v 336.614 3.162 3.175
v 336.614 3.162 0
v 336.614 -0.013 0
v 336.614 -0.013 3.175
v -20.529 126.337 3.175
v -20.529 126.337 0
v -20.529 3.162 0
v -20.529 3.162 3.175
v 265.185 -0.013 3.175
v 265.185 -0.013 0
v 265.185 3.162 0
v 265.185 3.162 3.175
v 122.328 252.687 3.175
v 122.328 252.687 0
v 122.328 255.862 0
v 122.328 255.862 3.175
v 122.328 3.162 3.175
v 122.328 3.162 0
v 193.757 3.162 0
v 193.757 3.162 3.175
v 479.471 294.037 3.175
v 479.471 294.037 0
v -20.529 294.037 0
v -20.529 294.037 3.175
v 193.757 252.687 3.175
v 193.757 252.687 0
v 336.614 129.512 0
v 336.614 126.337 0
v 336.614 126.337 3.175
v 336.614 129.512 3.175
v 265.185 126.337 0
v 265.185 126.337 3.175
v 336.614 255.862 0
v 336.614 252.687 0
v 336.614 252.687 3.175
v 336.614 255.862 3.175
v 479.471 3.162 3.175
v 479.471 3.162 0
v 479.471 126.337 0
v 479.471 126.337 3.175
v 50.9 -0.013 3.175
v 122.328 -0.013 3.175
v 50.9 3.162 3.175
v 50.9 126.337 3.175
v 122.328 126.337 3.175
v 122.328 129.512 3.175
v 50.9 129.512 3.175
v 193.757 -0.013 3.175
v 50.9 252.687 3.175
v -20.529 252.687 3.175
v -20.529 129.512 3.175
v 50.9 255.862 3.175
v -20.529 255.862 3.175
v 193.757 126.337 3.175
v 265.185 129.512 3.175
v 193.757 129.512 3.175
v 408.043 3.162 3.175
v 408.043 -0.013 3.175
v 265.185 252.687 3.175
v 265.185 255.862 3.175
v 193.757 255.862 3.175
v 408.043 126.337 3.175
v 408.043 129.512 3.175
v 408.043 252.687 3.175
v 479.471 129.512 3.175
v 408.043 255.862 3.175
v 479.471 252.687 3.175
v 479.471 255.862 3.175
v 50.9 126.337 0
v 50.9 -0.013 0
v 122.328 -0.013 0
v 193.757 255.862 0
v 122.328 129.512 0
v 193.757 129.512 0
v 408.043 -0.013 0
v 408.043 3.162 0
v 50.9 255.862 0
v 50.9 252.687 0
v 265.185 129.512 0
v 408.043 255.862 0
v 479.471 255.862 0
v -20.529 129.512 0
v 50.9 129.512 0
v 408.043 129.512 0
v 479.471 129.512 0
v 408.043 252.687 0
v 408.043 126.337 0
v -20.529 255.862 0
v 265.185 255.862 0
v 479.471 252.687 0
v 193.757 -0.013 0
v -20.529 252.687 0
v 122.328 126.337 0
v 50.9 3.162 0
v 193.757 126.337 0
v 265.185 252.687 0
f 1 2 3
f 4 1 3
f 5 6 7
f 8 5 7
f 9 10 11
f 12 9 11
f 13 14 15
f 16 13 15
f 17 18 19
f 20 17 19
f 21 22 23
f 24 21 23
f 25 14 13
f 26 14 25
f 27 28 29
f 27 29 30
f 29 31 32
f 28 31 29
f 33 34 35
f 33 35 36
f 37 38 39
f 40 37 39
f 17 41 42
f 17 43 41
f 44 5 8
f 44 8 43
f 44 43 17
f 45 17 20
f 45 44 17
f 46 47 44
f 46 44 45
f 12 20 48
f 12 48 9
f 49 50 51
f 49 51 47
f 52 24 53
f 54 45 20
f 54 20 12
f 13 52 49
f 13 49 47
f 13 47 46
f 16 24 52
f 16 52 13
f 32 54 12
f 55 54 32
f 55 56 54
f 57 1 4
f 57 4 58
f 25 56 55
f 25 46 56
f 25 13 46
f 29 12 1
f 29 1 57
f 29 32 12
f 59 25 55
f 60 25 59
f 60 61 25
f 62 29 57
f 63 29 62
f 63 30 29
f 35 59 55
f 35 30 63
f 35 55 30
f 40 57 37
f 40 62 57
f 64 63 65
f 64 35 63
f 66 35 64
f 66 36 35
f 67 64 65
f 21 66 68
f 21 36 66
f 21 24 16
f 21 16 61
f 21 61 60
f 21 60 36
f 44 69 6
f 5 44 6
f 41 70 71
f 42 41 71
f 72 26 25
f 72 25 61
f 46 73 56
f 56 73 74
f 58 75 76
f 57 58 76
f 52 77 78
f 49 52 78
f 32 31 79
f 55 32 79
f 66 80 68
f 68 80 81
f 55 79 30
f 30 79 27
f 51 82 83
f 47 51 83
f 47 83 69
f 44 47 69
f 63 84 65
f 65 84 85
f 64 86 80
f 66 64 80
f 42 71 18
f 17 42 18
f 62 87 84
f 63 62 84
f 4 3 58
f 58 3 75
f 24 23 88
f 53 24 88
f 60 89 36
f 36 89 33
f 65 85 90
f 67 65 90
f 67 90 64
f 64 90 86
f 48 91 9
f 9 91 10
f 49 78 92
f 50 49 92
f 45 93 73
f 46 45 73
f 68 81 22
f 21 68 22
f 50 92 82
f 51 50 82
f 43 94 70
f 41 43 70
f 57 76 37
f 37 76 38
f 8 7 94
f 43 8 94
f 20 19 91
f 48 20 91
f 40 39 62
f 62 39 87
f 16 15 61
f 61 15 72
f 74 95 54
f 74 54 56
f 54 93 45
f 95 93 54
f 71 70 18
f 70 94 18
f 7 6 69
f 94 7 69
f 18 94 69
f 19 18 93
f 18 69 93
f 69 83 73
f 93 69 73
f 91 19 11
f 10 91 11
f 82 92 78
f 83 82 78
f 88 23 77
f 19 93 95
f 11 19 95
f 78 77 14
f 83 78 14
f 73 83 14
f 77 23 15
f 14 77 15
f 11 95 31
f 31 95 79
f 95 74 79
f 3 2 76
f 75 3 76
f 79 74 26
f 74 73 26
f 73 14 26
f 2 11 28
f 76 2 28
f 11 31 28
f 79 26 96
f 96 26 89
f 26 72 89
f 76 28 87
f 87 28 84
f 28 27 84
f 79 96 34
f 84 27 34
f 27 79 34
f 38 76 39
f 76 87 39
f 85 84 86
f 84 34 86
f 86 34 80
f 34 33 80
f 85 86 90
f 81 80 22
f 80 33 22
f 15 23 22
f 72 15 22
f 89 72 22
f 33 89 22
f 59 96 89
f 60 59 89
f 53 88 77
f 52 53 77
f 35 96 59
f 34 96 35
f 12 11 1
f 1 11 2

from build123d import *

# Parameters (mm, degrees)
SKETCH1_W           = 71.428571428
SKETCH1_H           = 3.175
SKETCH1_W_2         = 71.428571429
BOSS_EXTRUDE1_DEPTH = 3.175


with BuildPart() as part:
    # Sketch1 → Boss-Extrude1 (new body)
    with BuildSketch(Plane.XY):
        Polygon((50.899754495, -0.012509515), (122.328325923, -0.012509515), (122.328325923, 3.162490485), (193.756897352, 3.162490485), (193.756897352, -0.012509515), (265.185468781, -0.012509515), (265.185468781, 3.162490485), (336.614040209, 3.162490485), (336.614040209, -0.012509515), (408.042611638, -0.012509515), (408.042611638, 3.162490485), (479.471183066, 3.162490485), (479.471183066, 126.337490485), (408.042611638, 126.337490485), (408.042611638, 129.512490485), (479.471183066, 129.512490485), (479.471183066, 252.687490485), (408.042611638, 252.687490485), (408.042611638, 255.862490485), (479.471183066, 255.862490485), (479.471183066, 294.037490485), (166.471183066, 294.037490485), (-20.528816934, 294.037490485), (-20.528816934, 255.862490485), (50.899754495, 255.862490485), (50.899754495, 252.687490485), (-20.528816934, 252.687490485), (-20.528816934, 129.512490485), (50.899754495, 129.512490485), (50.899754495, 126.337490485), (-20.528816934, 126.337490485), (-20.528816934, 3.162490485), (50.899754495, 3.162490485), align=None)
        with Locations((300.899754495, 127.924990485)):
            Rectangle(SKETCH1_W, SKETCH1_H, mode=Mode.SUBTRACT)
        with Locations((300.899754495, 254.274990485)):
            Rectangle(SKETCH1_W, SKETCH1_H, mode=Mode.SUBTRACT)
        with Locations((158.042611638, 127.924990485)):
            Rectangle(SKETCH1_W_2, SKETCH1_H, mode=Mode.SUBTRACT)
        with Locations((158.042611638, 254.274990485)):
            Rectangle(SKETCH1_W_2, SKETCH1_H, mode=Mode.SUBTRACT)
    extrude(amount=BOSS_EXTRUDE1_DEPTH)


solid = part.part
